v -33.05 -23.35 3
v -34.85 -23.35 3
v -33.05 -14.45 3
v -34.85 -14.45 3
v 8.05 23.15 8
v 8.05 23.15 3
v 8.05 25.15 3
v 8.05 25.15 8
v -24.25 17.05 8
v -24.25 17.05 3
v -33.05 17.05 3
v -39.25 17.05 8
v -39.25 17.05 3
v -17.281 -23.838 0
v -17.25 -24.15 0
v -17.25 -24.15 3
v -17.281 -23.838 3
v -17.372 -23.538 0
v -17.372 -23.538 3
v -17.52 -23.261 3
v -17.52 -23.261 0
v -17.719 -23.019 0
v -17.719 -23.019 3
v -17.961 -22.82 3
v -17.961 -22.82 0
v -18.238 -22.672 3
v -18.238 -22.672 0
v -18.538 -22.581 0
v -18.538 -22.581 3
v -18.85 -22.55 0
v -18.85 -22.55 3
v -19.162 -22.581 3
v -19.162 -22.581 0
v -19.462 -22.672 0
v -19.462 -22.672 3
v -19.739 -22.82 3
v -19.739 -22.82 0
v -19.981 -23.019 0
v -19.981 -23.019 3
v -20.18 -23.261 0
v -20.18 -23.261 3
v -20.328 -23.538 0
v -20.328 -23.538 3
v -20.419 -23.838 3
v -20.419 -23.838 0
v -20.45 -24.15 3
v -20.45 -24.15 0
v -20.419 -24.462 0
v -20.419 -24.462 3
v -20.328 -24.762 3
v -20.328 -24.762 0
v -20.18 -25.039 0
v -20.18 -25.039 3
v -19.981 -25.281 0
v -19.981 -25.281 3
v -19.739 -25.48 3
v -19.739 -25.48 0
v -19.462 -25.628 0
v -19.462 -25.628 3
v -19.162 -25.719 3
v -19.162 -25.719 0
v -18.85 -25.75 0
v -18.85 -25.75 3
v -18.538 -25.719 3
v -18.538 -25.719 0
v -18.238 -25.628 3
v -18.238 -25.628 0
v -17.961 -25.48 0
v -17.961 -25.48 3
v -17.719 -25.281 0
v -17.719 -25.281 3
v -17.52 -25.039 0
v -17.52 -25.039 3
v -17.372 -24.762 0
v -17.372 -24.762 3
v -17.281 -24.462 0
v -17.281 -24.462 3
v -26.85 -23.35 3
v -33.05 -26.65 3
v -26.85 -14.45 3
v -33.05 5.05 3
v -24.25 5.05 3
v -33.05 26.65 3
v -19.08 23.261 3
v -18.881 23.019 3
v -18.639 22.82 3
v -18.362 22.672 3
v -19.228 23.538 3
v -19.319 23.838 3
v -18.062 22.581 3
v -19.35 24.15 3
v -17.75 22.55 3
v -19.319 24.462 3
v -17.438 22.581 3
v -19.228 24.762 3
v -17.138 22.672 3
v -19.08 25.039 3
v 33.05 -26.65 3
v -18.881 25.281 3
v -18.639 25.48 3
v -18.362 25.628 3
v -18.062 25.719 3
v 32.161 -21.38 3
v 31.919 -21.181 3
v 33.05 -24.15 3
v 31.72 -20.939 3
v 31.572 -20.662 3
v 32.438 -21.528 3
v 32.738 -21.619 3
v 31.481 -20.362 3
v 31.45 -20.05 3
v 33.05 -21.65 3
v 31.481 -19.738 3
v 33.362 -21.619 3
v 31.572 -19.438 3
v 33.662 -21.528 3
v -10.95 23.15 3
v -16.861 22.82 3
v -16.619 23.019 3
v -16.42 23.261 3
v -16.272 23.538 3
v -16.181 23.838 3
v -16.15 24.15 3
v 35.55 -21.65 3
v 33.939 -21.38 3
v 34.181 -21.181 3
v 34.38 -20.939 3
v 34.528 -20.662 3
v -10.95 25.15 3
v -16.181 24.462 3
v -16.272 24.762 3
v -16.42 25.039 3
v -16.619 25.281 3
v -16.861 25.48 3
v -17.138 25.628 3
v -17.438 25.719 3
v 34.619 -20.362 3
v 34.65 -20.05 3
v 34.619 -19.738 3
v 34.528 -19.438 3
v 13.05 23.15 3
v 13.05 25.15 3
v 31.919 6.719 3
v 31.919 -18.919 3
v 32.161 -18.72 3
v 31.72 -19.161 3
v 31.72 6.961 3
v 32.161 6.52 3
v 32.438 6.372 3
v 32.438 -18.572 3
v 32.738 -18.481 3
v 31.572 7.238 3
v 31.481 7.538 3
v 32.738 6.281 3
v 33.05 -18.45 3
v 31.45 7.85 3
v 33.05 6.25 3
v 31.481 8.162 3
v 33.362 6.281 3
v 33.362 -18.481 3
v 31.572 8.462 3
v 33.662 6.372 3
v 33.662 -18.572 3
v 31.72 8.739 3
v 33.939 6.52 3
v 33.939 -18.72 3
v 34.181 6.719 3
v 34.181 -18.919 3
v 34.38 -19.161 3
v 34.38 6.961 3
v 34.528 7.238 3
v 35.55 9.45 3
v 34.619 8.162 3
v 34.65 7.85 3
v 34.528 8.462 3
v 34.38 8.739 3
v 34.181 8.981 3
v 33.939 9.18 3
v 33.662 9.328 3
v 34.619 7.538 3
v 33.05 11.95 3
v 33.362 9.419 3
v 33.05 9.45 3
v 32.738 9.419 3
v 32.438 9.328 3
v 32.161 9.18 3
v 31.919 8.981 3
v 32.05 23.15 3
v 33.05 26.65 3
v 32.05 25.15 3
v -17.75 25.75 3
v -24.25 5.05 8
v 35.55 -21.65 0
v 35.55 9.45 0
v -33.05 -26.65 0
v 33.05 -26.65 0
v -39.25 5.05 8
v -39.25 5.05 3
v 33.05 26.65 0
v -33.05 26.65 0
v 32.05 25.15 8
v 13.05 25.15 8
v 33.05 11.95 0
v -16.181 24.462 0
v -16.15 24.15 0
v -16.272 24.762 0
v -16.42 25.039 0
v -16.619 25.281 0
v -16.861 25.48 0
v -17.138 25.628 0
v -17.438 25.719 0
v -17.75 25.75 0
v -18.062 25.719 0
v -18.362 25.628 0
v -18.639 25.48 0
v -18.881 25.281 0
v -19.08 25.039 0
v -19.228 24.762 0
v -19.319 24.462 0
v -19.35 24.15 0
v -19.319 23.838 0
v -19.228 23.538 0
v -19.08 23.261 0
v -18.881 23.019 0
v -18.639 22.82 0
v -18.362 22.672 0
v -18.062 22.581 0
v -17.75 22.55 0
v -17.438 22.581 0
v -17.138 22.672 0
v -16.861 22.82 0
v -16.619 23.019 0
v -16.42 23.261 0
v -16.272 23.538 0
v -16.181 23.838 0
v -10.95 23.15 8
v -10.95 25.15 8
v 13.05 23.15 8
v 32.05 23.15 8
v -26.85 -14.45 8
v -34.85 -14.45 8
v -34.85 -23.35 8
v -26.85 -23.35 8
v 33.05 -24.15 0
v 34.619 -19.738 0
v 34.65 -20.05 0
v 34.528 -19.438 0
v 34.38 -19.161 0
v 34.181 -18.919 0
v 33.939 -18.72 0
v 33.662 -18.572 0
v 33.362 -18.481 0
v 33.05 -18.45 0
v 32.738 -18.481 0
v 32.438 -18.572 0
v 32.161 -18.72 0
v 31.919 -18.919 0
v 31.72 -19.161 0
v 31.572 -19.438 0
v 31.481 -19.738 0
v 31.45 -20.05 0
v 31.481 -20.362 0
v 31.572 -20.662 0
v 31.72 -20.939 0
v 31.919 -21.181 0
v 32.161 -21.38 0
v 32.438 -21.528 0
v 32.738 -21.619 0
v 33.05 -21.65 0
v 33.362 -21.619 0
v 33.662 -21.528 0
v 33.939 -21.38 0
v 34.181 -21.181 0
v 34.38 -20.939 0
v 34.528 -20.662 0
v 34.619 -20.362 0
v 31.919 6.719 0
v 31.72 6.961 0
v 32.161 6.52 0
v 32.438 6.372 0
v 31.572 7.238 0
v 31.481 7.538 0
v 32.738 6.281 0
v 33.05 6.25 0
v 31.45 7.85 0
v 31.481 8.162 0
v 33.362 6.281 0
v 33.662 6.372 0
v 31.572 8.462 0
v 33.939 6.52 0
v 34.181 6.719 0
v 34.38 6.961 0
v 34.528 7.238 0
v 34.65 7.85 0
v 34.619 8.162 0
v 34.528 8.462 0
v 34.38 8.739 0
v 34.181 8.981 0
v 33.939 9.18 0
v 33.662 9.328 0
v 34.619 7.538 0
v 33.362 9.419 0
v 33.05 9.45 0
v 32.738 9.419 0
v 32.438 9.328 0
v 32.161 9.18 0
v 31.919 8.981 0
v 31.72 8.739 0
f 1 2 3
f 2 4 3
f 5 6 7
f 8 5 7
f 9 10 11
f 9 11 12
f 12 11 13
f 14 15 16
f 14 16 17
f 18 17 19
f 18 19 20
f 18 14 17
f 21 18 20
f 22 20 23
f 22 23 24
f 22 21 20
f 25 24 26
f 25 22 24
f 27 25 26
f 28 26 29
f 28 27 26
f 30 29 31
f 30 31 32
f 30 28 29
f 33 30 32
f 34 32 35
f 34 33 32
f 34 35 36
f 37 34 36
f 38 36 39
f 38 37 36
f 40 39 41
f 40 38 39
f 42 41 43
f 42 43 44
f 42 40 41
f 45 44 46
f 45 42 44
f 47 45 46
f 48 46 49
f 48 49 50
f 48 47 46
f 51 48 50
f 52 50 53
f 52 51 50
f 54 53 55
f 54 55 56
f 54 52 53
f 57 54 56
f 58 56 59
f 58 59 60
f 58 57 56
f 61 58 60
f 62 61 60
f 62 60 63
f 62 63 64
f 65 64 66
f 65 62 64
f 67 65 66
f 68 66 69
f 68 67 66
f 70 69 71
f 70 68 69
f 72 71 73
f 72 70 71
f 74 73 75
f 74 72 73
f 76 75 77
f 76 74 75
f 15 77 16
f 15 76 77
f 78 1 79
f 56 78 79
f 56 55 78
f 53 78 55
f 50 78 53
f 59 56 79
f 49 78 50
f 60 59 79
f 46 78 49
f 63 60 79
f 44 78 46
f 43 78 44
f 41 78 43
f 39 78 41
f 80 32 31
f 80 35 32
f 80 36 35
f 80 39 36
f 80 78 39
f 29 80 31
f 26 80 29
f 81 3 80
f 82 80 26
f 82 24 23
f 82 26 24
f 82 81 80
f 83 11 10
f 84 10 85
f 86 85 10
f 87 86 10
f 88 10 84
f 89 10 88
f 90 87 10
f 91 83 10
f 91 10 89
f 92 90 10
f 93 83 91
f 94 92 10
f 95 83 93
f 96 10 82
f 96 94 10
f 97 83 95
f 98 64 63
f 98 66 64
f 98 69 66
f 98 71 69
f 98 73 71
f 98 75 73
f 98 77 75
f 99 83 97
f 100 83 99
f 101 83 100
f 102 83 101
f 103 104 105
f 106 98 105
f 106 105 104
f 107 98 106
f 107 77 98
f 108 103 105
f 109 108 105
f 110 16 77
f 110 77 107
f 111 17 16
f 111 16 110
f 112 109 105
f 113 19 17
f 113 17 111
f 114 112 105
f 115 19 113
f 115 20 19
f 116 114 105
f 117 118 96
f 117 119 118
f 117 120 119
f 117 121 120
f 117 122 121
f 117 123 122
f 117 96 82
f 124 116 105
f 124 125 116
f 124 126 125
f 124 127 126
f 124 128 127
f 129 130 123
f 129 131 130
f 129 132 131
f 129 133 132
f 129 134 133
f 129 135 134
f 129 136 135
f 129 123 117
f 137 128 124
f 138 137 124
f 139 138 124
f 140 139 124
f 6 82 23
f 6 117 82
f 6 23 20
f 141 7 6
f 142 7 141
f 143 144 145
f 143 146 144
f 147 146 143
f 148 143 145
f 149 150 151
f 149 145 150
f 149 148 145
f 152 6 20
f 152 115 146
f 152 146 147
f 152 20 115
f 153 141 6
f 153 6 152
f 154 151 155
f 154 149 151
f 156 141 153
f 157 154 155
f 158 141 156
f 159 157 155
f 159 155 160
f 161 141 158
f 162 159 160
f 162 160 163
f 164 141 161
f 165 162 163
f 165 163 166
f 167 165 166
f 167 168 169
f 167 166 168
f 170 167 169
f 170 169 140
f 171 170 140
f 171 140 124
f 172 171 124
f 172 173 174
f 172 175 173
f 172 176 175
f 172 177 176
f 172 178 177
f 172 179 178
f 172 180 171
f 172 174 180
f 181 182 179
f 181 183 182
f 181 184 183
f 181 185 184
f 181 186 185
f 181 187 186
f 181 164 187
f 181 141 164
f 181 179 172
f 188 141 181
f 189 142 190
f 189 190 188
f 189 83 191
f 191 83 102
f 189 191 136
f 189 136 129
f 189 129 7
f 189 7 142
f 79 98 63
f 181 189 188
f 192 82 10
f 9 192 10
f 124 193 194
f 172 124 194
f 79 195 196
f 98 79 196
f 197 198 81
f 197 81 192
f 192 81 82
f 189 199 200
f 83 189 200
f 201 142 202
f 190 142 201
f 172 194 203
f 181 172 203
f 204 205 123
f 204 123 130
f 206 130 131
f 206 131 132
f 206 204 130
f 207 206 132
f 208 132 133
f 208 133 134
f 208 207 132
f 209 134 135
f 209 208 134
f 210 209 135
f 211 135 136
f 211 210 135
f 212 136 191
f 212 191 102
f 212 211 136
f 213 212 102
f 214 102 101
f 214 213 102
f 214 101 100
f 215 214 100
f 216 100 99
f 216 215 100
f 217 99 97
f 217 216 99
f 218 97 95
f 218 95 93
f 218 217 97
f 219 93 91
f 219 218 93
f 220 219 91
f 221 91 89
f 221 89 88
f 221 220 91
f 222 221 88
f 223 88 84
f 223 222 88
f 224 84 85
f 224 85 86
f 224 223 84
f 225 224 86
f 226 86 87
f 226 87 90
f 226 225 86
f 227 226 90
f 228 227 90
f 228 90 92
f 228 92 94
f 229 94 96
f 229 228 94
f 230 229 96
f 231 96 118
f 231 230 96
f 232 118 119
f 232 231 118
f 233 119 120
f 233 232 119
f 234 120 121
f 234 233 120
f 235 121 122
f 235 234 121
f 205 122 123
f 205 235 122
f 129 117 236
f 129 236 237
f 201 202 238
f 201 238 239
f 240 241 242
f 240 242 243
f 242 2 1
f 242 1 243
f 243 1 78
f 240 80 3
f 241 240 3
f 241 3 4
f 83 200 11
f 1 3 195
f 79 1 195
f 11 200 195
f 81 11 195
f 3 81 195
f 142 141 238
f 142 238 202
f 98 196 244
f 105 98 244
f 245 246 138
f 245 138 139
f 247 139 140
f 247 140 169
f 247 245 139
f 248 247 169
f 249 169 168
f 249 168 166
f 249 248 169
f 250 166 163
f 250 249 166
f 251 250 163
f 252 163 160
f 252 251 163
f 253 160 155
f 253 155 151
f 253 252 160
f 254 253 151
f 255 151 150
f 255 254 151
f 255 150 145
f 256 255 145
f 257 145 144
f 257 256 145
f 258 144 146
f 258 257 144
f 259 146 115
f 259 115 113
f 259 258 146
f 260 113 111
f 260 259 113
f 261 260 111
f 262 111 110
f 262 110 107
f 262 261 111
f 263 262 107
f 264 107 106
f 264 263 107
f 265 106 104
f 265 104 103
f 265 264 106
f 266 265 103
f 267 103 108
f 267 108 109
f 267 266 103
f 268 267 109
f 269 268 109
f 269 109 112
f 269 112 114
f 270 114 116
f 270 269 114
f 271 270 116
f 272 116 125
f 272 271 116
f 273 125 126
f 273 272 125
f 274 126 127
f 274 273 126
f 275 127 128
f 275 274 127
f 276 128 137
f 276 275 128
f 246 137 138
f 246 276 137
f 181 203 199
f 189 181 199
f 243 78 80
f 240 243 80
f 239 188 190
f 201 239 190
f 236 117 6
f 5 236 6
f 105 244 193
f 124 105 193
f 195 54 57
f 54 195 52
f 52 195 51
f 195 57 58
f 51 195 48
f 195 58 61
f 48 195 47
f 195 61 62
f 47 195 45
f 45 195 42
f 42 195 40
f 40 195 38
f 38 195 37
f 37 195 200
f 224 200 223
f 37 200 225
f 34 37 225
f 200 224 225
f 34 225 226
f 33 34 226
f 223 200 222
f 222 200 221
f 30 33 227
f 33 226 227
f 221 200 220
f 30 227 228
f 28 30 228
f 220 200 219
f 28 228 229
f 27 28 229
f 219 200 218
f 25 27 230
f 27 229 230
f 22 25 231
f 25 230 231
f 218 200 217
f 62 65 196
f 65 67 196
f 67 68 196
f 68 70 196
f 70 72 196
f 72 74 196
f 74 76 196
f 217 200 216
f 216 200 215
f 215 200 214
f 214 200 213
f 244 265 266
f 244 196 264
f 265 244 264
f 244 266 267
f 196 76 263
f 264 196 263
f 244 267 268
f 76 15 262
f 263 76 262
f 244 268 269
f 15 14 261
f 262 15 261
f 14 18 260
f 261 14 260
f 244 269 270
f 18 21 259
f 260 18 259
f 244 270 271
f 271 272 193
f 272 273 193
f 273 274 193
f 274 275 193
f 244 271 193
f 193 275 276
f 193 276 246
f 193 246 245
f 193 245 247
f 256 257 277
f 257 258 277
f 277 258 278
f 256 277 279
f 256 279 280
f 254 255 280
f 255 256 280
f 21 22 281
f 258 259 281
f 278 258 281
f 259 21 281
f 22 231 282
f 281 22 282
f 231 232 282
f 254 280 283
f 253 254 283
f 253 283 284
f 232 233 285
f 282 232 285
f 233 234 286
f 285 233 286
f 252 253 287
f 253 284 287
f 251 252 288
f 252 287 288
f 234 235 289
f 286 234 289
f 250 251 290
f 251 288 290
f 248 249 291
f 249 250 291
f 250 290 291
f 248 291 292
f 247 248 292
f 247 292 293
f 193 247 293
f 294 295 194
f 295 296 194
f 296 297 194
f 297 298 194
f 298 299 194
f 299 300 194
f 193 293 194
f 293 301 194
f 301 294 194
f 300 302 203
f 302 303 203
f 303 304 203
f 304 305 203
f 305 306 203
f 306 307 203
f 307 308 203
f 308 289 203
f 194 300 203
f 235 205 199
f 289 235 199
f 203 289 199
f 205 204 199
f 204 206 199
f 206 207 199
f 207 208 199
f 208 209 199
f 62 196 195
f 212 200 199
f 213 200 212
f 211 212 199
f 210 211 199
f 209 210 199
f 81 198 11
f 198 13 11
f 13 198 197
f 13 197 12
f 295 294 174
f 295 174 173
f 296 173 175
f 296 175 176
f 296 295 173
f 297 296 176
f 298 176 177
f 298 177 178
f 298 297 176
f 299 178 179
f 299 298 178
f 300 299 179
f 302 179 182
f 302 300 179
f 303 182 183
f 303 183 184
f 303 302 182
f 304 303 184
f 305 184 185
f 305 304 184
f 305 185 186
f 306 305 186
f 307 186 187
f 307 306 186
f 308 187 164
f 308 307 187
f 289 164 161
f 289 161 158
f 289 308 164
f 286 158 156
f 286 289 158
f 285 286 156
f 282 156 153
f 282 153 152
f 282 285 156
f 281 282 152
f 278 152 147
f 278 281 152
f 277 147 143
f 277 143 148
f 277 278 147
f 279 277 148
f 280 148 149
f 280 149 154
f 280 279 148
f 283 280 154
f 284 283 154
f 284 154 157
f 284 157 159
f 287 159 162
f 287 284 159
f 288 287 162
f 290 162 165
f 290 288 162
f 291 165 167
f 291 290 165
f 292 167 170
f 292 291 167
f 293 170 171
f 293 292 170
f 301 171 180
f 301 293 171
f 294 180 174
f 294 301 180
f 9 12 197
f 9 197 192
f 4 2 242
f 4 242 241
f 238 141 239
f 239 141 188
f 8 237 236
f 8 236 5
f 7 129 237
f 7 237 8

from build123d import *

# Parameters (mm, degrees)
CROQUIS1_R              = 1.6
SALIENTE_EXTRUIR1_DEPTH = 3
CROQUIS2_W              = 8.8
CROQUIS2_H              = 12
CROQUIS2_W_2            = 6.2
CROQUIS2_H_2            = 8.9
CROQUIS2_W_3            = 1.8
CROQUIS2_W_4            = 19
CROQUIS2_H_3            = 2
SALIENTE_EXTRUIR2_DEPTH = 5


with BuildPart() as part:
    # Croquis1 → Saliente-Extruir1 (new body)
    with BuildSketch(Plane.XY):
        Polygon((-33.05, 26.65), (-33.05, -26.65), (33.05, -26.65), (33.05, -24.15), (35.55, -21.65), (35.55, 9.45), (33.05, 11.95), (33.05, 26.65), align=None)
        with Locations((33.05, -20.05)):
            Circle(CROQUIS1_R, mode=Mode.SUBTRACT)
        with Locations((33.05, 7.85)):
            Circle(CROQUIS1_R, mode=Mode.SUBTRACT)
        with Locations((-18.85, -24.15)):
            Circle(CROQUIS1_R, mode=Mode.SUBTRACT)
        with Locations((-17.75, 24.15)):
            Circle(CROQUIS1_R, mode=Mode.SUBTRACT)
    extrude(amount=SALIENTE_EXTRUIR1_DEPTH)

    # Croquis2 → Saliente-Extruir2 (add)
    with BuildSketch(Plane.XY.offset(3)):
        with Locations((-28.65, 11.05)):
            Rectangle(CROQUIS2_W, CROQUIS2_H)
        with Locations((-29.95, -18.9)):
            Rectangle(CROQUIS2_W_2, CROQUIS2_H_2)
        with Locations((-36.15, 11.05)):
            Rectangle(CROQUIS2_W_2, CROQUIS2_H)
        with Locations((-33.95, -18.9)):
            Rectangle(CROQUIS2_W_3, CROQUIS2_H_2)
        with Locations((22.55, 24.15)):
            Rectangle(CROQUIS2_W_4, CROQUIS2_H_3)
        with Locations((-1.45, 24.15)):
            Rectangle(CROQUIS2_W_4, CROQUIS2_H_3)
    extrude(amount=SALIENTE_EXTRUIR2_DEPTH)


solid = part.part
